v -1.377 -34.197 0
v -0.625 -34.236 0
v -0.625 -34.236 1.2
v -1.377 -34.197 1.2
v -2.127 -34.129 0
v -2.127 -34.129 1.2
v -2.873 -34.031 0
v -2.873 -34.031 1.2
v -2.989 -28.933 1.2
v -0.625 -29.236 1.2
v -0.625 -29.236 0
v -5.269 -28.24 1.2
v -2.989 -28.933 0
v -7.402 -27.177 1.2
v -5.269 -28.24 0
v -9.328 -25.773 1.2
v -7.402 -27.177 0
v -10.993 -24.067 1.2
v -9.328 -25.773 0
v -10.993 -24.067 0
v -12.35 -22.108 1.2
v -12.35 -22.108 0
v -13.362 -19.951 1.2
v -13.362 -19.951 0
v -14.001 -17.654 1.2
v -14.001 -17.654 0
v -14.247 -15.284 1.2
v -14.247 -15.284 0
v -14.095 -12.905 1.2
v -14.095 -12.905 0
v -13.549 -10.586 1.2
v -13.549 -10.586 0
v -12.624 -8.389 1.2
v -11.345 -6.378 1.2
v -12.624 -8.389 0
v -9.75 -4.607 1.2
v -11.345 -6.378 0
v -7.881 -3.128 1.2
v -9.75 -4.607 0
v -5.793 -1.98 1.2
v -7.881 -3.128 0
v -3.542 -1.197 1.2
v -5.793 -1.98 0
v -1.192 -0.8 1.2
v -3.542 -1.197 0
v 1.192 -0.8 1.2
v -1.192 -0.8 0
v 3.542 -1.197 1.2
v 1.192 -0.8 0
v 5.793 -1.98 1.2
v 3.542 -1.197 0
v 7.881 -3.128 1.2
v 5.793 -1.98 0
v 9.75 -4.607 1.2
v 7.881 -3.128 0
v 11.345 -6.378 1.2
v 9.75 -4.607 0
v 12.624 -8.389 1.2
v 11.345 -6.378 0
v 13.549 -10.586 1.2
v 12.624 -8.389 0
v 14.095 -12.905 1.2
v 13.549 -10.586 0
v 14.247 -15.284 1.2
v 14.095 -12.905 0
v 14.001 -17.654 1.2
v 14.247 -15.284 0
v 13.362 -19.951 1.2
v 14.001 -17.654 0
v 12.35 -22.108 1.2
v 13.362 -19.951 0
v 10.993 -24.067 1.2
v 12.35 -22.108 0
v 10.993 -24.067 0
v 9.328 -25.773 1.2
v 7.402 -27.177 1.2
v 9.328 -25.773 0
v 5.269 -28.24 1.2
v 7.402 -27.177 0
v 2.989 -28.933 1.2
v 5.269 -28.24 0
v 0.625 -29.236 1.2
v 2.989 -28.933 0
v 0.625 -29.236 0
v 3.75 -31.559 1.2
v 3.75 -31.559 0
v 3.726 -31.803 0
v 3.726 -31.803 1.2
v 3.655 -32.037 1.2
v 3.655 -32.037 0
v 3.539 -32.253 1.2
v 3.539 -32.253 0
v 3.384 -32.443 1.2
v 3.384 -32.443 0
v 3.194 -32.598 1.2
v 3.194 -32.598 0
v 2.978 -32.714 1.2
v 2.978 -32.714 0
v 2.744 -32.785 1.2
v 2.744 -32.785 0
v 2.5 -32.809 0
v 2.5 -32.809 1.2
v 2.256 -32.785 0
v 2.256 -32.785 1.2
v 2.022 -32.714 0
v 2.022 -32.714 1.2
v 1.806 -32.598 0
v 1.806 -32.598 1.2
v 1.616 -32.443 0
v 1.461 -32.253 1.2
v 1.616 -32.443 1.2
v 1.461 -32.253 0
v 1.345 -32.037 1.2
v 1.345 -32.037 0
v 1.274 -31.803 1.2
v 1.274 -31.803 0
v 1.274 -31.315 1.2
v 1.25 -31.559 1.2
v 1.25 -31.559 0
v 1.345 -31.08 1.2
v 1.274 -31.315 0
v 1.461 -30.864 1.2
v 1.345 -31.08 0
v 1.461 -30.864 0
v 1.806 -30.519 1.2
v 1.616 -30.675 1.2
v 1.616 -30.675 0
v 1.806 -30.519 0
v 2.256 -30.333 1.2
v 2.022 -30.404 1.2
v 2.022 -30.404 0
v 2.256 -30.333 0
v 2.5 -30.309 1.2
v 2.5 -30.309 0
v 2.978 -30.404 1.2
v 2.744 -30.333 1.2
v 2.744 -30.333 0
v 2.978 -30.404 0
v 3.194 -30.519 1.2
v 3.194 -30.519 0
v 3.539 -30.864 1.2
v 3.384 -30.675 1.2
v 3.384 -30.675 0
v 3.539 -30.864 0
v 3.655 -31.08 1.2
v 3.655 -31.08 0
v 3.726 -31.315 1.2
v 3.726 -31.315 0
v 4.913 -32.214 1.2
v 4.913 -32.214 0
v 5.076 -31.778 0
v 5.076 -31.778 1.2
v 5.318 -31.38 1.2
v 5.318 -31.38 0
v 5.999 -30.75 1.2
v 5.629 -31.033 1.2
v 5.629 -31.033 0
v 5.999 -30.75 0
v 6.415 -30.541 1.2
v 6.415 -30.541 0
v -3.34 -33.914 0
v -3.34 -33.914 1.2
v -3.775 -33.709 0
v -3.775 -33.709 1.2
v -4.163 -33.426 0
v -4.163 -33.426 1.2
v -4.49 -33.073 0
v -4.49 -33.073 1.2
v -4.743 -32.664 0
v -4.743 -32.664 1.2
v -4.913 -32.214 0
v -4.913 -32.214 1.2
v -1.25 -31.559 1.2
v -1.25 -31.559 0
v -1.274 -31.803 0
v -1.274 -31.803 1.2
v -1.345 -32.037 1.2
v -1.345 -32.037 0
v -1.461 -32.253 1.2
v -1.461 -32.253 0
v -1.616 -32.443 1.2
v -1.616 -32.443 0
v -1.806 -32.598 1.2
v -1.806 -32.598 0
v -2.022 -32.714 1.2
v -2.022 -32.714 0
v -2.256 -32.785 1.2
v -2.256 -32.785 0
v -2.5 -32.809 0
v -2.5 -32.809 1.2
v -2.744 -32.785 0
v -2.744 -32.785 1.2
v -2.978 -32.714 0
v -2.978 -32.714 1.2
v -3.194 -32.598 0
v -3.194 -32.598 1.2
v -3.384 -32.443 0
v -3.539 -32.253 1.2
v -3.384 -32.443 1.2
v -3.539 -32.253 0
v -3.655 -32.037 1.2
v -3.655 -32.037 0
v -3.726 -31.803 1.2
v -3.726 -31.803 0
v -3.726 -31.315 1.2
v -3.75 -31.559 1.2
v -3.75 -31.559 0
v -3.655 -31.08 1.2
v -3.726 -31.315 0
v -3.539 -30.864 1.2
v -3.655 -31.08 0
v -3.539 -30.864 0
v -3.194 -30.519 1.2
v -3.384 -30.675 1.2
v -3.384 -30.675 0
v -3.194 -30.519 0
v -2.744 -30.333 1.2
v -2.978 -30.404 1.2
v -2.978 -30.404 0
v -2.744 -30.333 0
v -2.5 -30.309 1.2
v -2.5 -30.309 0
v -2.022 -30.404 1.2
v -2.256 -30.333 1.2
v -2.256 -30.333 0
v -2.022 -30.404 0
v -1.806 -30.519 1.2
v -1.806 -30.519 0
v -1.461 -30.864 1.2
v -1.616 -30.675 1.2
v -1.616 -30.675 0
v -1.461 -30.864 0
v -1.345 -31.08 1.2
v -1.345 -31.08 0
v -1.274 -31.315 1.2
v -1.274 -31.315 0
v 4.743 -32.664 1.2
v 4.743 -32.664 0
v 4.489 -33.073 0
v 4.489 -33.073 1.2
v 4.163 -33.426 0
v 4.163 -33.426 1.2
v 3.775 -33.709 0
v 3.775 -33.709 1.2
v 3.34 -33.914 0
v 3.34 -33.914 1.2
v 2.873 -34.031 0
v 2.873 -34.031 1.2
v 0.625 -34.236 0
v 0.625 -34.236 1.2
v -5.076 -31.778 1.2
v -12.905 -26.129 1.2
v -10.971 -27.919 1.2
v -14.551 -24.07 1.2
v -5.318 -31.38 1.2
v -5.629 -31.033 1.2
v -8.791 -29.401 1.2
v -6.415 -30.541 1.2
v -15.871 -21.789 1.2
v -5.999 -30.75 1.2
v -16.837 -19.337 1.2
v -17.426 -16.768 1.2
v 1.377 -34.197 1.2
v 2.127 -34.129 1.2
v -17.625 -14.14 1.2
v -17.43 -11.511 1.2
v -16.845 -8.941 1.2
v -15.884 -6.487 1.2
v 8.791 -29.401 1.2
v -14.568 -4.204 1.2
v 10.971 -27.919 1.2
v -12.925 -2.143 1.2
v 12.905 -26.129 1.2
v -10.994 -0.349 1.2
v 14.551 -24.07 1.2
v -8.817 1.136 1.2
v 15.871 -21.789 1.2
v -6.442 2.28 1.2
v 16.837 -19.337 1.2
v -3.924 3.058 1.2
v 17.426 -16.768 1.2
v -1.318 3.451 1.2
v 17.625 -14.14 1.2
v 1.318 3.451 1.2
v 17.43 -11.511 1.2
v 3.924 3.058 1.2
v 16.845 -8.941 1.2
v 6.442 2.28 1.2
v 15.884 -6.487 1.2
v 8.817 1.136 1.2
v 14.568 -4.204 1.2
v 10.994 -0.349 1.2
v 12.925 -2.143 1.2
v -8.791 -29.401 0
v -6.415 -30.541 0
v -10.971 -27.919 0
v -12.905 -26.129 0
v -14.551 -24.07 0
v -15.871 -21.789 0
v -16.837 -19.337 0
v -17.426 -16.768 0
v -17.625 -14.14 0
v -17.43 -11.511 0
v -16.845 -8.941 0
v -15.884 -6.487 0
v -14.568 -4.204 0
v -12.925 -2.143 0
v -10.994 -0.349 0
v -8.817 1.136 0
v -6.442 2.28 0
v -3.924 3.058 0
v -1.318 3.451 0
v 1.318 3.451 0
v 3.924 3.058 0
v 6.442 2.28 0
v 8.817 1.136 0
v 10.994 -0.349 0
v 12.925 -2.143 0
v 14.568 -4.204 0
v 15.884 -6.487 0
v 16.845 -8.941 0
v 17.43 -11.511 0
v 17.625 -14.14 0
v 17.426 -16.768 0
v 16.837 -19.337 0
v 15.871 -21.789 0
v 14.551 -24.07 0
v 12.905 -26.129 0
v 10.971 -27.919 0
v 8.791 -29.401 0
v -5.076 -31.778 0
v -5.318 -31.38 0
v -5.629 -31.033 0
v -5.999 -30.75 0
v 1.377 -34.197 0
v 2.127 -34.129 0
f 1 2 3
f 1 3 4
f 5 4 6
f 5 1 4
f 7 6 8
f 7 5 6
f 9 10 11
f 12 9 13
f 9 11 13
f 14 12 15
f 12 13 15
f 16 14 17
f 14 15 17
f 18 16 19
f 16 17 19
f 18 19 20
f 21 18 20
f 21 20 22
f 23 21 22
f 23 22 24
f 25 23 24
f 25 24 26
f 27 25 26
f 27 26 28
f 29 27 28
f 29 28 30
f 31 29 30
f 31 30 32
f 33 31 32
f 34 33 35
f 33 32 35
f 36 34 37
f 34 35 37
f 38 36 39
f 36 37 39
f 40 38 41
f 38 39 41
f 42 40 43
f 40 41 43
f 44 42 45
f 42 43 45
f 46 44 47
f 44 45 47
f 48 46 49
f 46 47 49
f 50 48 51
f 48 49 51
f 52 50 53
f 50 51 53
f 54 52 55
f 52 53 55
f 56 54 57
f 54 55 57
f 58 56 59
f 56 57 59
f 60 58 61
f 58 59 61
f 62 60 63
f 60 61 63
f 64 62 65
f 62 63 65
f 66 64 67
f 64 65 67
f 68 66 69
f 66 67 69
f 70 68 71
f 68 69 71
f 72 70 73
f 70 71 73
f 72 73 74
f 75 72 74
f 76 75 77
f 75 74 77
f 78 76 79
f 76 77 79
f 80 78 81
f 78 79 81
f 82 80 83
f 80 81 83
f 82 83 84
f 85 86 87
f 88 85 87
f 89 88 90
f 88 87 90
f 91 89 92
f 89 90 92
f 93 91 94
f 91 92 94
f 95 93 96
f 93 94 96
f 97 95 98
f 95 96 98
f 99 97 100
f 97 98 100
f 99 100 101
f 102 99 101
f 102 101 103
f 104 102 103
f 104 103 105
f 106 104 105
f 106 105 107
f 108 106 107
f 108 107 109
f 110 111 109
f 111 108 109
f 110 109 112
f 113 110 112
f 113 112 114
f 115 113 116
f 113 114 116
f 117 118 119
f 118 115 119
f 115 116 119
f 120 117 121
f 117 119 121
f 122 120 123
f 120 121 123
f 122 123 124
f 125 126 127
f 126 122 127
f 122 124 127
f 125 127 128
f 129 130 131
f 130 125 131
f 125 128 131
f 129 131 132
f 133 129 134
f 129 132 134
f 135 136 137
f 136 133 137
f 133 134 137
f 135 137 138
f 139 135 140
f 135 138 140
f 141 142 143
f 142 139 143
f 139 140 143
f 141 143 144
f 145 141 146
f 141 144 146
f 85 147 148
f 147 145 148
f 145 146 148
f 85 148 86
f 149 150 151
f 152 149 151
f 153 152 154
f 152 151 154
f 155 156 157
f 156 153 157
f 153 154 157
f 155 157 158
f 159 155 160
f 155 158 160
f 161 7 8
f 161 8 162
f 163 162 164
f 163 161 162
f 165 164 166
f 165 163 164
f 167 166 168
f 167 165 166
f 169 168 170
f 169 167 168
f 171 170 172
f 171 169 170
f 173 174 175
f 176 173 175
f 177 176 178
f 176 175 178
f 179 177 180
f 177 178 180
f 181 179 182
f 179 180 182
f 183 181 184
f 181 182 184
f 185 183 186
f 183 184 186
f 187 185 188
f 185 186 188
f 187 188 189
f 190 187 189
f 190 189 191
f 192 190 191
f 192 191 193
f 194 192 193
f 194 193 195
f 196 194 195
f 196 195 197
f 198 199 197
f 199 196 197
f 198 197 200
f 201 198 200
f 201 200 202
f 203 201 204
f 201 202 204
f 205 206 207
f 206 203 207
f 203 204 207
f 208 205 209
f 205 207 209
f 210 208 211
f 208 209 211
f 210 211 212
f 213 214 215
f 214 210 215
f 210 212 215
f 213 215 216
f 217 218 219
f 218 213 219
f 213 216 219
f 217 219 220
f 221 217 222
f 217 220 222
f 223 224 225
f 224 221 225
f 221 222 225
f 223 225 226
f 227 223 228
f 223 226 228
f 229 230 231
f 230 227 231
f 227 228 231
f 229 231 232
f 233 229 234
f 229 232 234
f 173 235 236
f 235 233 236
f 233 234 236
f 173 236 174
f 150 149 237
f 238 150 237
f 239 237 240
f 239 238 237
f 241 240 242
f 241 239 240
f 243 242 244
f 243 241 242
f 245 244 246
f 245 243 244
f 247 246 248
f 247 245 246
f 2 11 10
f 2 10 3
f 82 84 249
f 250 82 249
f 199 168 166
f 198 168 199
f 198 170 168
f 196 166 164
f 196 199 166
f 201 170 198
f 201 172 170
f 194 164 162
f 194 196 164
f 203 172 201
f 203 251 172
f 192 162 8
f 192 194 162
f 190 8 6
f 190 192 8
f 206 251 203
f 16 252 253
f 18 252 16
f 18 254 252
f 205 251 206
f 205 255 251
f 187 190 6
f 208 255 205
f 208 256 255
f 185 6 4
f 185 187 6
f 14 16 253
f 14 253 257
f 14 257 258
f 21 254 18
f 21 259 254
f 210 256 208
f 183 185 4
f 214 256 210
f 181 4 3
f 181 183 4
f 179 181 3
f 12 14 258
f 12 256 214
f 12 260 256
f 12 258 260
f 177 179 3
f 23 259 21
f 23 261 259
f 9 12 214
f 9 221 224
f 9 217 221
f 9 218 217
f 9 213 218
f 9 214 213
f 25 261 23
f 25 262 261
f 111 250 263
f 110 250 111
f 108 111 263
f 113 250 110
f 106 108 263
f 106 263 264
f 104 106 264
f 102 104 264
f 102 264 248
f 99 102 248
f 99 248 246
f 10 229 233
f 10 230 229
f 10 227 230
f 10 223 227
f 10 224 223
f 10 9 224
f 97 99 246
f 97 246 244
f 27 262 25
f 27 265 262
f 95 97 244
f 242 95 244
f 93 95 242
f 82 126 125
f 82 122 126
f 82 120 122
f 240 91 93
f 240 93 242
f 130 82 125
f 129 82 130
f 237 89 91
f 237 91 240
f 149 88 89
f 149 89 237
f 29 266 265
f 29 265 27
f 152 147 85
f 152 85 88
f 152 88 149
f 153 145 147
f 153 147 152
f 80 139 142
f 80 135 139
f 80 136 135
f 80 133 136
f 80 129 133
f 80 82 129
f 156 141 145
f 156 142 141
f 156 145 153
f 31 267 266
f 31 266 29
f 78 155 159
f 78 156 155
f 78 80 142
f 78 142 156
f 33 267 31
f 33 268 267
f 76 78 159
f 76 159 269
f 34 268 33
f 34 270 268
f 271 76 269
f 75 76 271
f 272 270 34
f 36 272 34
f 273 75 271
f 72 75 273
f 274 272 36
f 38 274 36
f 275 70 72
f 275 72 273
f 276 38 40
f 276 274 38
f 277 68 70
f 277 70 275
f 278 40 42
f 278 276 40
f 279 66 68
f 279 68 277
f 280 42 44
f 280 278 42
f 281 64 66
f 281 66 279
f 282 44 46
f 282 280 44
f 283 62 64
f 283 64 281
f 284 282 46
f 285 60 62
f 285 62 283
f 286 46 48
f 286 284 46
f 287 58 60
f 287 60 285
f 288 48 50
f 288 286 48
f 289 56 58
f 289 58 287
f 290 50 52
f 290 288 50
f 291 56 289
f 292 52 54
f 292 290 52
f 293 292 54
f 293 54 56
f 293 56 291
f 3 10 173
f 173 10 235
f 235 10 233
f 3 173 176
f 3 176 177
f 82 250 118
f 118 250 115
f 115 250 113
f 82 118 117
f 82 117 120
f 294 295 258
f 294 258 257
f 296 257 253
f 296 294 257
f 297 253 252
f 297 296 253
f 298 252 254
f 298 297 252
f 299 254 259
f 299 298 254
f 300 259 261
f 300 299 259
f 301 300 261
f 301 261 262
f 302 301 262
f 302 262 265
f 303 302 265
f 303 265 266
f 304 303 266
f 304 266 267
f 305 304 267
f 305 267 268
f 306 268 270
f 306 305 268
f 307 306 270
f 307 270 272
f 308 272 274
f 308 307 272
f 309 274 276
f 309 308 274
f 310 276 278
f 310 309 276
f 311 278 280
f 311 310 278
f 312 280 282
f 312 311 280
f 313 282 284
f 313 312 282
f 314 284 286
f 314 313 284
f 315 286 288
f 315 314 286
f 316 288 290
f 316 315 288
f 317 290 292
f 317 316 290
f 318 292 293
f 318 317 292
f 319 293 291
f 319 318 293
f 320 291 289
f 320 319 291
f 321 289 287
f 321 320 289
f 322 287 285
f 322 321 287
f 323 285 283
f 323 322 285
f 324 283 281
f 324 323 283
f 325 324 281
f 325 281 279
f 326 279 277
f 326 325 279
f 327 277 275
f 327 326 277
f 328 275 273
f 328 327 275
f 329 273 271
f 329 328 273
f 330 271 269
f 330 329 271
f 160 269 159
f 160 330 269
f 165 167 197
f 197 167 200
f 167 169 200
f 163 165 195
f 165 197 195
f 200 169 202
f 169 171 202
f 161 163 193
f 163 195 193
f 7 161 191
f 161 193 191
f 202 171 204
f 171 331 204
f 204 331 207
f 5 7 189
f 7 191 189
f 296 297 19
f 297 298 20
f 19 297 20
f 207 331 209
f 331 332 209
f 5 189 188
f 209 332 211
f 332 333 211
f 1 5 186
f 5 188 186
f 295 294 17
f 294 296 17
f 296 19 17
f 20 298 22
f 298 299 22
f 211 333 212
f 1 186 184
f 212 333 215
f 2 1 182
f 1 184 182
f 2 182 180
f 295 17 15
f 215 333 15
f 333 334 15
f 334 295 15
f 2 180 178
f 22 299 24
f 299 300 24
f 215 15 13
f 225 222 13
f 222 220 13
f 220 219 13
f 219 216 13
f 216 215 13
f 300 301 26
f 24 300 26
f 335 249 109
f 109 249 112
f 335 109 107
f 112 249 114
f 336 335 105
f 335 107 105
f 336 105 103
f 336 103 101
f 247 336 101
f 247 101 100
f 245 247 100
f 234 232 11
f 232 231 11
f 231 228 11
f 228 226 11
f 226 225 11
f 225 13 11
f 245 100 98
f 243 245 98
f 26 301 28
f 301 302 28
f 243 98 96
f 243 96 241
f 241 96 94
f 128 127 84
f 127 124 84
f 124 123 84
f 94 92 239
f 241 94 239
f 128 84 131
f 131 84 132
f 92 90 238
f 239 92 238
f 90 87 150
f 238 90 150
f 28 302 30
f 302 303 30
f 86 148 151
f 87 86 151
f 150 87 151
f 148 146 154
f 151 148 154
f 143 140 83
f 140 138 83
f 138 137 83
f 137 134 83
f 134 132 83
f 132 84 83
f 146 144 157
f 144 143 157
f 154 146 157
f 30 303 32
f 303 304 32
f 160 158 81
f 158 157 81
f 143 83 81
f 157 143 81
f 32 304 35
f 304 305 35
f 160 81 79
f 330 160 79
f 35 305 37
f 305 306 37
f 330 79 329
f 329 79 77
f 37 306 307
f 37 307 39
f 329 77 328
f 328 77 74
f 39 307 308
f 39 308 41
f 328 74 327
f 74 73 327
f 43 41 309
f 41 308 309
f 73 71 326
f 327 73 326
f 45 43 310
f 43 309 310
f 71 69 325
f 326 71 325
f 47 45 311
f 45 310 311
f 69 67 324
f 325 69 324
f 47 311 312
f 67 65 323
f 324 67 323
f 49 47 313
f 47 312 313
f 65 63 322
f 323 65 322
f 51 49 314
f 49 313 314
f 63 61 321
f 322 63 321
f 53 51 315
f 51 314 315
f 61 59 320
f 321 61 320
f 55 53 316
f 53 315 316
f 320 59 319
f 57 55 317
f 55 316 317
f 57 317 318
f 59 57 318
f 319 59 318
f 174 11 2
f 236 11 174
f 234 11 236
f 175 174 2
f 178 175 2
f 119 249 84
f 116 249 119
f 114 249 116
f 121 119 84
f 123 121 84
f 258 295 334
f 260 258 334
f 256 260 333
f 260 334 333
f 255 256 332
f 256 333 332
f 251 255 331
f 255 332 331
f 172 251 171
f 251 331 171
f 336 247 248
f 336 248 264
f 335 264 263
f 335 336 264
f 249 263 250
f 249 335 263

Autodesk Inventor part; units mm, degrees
ref_plane "YZ Plane" through (0, 0, 0) normal (1, 0, 0) x (0, 1, 0)
ref_plane "XZ Plane" through (0, 0, 0) normal (0, 1, 0) x (-1, 0, 0)
sketch "Эскиз1" plane through (0, 0, 0) normal (0, 0, 1) x (1, 0, 0)
  line L0 (-6, 0) -> (6, 0) construction
  arc A0 (0.625, -29.2363) -> (-0.625, -29.2363) centre (0, -15) ccw
  line L1 (0, 20.1894) -> (0, -80.5364) projected
  line L2 (-48.09, 0) -> (48.09, 0) projected
  line L3 (-0.625, -29.2363) -> (-0.625, -34.2363)
  line L4 (-0.625, -6.5402) -> (-0.625, -13.29) construction
  line L5 (-2.7947, 3.5) -> (3.6722, 3.5) construction
  arc A1 (6.4152, -30.541) -> (-6.4152, -30.541) centre (0, -14.125) ccw
  arc A2 (-2.8732, -34.0308) -> (-0.625, -34.2363) centre (0, -15) ccw
  arc A3 (-4.9126, -32.2142) -> (-2.8732, -34.0308) centre (-2.5, -31.5588) ccw
  arc A4 (-4.9126, -32.2142) -> (-6.4152, -30.541) centre (-7.3251, -32.8695) ccw
  line L6 (0.625, -29.2363) -> (0.625, -34.2363)
  line L7 (0.625, -6.5402) -> (0.625, -13.29) construction
  arc A5 (0.625, -34.2363) -> (2.8732, -34.0308) centre (0, -15) ccw
  arc A6 (2.8732, -34.0308) -> (4.9126, -32.2142) centre (2.5, -31.5588) ccw
  arc A7 (6.4152, -30.541) -> (4.9126, -32.2142) centre (7.3251, -32.8695) ccw
  circle A8 centre (-2.5, -31.5588) radius 1.25
  circle A9 centre (2.5, -31.5588) radius 1.25
  dimension "d0" = 28.5
  dimension "d1" = 5
  dimension "d6" = 0.625
  dimension "d7" = 3.5
  dimension "d8" = 0.875
  dimension "d9" = 2.5
  dimension "d10" = 2.5
  dimension "d11" = 1.875
  dimension "d12" = 2.5
  dimension "d13" = 2.5
  dimension "d14" = 15
extrude "Базовый элемент" add sketch "Эскиз1" along normal blind 1.2
ref_plane "Work Plane1" through (0, -15, 0) normal (1, 0, 0) x (0, 0, 1)
equation "\"d0\" = ND"
equation "\"d1\" = SRB2"
equation "\"d6\" = 0.25 * SD5"
equation "\"d7\" = SRB1"
equation "\"d8\" = 0.25 * SRB1"
equation "\"d9\" = SD5"
equation "\"d10\" = SD5"
equation "\"d11\" = 0.75 * SD5"
equation "\"d12\" = SD5"
equation "\"d13\" = SD5"
equation "\"d14\" = 0.5 * WD"
equation "\"d2\" = SD"
equation "\"SD\" = 1.2"
equation "\"SRB1\" = 3.5"
equation "\"ND\" = 28.5"
equation "\"SRB2\" = 5"
equation "\"SD5\" = 2.5"
equation "\"SD3\" = 27.8"
equation "\"WDMAX\" = 32"
equation "\"SNB\" = 1.4"
equation "\"BUBRMI\" = 2.7"
equation "\"WD\" = 30"
properties part number "Кольцо A30 ГОСТ 13942-86" material "Сталь, мягкая"
